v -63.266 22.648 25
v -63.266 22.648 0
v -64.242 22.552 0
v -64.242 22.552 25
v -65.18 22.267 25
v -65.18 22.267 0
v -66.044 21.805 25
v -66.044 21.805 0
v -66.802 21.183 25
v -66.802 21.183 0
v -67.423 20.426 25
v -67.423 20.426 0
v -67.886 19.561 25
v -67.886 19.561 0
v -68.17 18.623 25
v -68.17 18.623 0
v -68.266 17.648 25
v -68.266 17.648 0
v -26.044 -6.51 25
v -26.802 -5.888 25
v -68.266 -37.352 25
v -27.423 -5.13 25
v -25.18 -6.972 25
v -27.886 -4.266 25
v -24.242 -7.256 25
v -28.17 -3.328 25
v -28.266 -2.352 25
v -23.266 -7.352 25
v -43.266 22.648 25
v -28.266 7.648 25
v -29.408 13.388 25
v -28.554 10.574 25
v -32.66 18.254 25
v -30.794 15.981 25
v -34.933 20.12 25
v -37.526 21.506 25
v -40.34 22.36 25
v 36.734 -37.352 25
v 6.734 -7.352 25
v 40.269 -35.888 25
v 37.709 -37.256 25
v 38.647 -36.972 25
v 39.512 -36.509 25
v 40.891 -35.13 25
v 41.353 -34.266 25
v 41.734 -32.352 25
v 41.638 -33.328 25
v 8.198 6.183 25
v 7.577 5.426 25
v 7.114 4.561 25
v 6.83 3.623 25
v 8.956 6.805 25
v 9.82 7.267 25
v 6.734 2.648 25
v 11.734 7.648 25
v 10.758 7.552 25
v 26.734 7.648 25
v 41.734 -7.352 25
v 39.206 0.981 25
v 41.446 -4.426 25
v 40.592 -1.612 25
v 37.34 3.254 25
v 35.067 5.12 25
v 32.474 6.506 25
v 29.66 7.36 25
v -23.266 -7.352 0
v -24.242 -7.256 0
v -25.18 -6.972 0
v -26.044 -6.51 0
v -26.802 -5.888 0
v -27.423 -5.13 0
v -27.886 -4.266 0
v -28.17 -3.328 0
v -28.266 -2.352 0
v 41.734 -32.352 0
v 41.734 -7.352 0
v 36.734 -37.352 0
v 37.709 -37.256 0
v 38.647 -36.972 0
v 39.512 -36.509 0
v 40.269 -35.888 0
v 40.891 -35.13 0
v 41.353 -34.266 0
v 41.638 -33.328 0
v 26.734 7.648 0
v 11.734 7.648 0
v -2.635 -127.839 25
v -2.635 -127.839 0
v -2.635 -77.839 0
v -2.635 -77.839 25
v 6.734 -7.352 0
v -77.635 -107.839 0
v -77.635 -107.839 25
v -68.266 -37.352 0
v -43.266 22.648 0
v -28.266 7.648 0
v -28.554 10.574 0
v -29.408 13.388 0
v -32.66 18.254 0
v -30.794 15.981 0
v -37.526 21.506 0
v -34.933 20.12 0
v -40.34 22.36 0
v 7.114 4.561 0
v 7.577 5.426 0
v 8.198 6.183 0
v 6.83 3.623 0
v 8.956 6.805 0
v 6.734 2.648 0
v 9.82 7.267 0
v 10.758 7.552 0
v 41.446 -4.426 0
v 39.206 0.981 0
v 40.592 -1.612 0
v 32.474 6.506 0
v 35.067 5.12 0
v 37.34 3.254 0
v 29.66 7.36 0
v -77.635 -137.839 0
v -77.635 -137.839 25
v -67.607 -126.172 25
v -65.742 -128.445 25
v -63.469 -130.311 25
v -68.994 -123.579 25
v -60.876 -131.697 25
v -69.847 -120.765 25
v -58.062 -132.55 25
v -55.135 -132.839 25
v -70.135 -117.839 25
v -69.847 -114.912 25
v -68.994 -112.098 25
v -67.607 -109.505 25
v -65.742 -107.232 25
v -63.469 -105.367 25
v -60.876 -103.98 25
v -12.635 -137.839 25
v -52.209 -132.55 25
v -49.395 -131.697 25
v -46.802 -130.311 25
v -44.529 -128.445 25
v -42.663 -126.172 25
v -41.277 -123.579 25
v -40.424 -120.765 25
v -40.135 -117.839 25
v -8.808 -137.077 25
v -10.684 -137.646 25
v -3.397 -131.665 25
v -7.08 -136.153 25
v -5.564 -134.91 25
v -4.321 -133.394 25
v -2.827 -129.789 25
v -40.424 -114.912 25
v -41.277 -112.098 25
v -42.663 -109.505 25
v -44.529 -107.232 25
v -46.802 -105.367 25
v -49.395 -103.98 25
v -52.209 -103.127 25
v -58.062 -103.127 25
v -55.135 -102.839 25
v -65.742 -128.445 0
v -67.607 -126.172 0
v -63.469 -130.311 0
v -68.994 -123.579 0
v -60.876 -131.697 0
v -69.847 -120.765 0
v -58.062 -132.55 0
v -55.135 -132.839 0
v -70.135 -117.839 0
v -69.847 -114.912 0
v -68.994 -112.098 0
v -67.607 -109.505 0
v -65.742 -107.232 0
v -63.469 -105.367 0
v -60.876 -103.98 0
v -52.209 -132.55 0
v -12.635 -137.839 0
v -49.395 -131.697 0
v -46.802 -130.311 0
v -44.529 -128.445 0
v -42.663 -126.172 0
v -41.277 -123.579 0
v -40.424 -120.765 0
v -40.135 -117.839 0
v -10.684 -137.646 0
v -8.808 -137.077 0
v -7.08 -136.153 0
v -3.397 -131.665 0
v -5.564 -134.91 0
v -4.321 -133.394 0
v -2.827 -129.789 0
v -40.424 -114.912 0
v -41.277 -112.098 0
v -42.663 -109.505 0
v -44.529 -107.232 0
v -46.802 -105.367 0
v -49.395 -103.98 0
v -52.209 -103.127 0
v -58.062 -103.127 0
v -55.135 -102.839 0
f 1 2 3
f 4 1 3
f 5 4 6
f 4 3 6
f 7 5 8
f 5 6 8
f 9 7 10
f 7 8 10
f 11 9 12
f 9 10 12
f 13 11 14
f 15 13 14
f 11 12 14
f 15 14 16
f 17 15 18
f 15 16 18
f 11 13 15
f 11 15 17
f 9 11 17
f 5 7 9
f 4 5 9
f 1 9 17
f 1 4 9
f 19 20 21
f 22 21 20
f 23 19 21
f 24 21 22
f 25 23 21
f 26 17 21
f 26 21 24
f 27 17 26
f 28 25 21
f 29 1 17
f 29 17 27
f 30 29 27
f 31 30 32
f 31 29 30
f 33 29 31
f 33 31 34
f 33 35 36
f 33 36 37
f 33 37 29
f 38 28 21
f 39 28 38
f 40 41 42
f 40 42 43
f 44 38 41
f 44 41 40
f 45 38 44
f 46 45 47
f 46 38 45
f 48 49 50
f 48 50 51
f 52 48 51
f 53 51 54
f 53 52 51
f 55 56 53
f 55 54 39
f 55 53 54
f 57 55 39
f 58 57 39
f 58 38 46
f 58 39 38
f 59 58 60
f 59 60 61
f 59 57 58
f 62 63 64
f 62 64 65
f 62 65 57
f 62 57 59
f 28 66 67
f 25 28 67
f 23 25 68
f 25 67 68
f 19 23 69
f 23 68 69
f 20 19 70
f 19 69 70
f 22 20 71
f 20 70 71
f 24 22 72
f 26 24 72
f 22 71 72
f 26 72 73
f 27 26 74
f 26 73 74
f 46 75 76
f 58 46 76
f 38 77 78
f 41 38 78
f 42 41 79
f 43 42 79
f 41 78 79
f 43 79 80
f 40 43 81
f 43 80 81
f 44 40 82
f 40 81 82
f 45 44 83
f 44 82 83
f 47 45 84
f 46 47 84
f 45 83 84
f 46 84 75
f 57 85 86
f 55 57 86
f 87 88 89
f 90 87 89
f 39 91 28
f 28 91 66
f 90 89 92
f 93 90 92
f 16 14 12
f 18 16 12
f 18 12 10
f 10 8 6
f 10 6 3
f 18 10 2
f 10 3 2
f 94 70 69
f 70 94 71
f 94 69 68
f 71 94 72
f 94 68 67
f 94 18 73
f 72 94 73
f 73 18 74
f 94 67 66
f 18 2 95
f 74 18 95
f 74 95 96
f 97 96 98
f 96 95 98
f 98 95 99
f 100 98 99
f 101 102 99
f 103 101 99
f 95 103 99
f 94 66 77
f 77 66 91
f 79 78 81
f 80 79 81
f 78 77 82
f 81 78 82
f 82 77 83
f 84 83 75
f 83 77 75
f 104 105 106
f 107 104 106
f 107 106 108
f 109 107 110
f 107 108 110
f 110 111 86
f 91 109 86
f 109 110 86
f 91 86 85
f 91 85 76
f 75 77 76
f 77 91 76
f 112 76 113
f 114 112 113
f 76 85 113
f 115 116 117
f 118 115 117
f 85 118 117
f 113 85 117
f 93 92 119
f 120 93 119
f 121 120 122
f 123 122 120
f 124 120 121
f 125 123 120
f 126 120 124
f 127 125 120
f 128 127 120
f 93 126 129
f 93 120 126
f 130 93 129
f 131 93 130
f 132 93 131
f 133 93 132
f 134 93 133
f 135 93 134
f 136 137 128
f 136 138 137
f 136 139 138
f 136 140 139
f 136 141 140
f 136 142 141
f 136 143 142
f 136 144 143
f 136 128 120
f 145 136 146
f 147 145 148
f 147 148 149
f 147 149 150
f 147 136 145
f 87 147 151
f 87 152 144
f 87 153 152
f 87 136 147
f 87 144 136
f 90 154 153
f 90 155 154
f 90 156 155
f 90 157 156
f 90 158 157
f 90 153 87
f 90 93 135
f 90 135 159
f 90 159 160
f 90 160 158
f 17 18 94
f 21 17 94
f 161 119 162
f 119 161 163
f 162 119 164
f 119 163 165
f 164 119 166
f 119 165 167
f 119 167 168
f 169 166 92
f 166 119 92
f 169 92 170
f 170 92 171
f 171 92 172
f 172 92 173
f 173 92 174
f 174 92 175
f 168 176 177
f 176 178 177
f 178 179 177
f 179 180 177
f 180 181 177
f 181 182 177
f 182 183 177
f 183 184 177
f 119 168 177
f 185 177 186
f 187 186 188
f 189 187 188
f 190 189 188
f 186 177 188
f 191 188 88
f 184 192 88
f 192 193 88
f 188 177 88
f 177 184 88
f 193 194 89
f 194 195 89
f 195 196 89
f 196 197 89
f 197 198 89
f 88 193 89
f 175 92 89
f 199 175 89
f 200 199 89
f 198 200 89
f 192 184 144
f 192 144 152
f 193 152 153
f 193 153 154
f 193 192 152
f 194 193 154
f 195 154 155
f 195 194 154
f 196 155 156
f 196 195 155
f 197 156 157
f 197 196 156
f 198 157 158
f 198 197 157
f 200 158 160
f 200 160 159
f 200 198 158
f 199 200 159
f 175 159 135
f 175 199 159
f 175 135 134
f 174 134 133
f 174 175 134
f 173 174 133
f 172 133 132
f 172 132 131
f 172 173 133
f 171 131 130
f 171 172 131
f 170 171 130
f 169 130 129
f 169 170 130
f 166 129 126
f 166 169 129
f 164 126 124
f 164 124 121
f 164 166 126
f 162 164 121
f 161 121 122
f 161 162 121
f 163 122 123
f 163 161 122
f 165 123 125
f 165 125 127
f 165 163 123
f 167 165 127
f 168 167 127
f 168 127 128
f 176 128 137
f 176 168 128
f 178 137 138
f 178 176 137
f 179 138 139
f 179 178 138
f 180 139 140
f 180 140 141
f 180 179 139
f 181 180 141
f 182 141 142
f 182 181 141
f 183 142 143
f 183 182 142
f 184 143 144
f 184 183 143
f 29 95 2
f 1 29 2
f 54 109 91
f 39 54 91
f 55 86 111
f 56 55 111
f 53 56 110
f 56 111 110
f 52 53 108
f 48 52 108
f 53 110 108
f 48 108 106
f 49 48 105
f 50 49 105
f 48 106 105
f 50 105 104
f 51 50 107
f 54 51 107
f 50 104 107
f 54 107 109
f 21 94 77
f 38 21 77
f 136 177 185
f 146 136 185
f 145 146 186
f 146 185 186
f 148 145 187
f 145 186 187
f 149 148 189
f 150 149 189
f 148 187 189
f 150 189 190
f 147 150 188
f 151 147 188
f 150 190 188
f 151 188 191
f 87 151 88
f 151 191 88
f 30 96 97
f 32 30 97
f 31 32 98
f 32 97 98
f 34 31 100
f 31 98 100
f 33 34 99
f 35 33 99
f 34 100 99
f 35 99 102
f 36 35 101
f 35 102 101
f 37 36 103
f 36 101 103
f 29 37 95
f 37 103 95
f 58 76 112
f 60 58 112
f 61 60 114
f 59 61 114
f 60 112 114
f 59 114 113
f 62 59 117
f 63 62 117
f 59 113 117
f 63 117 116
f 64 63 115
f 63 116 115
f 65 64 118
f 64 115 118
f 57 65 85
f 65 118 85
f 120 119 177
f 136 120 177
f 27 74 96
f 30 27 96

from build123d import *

# Parameters (mm, degrees)
F1_DEPTH = 25
F0_R     = 15
F2_DEPTH = 25


with BuildPart() as f1:
    # F0 (on Top) → F1 (new body)
    with BuildSketch(Plane.XY):
        with BuildLine():
            Line((-68.266129, 17.647848), (-68.266129, -37.352152))
            Line((-68.266129, -37.352152), (36.733871, -37.352152))
            ThreePointArc((36.733871, -37.352152), (40.269404, -35.887686), (41.733871, -32.352152))
            Line((41.733871, -32.352152), (41.733871, -7.352152))
            ThreePointArc((41.733871, -7.352152), (37.340472, 3.25445), (26.733871, 7.647848))
            Line((26.733871, 7.647848), (11.733871, 7.647848))
            ThreePointArc((11.733871, 7.647848), (8.198337, 6.183382), (6.733871, 2.647848))
            Line((6.733871, 2.647848), (6.733871, -7.352152))
            Line((6.733871, -7.352152), (-23.266129, -7.352152))
            ThreePointArc((-23.266129, -7.352152), (-26.801663, -5.887686), (-28.266129, -2.352152))
            Line((-28.266129, -2.352152), (-28.266129, 7.647848))
            ThreePointArc((-28.266129, 7.647848), (-32.659528, 18.25445), (-43.266129, 22.647848))
            Line((-43.266129, 22.647848), (-63.266129, 22.647848))
            ThreePointArc((-63.266129, 22.647848), (-66.801663, 21.183382), (-68.266129, 17.647848))
        make_face()
    extrude(amount=F1_DEPTH)


with BuildPart() as f2:
    # F0 (on Top) → F2 (new body)
    with BuildSketch(Plane.XY):
        with BuildLine():
            Line((-77.635311, -107.838587), (-77.635311, -137.838587))
            Line((-77.635311, -137.838587), (-12.635311, -137.838587))
            ThreePointArc((-12.635311, -137.838587), (-5.564243, -134.909655), (-2.635311, -127.838587))
            Line((-2.635311, -127.838587), (-2.635311, -77.838587))
            Line((-2.635311, -77.838587), (-77.635311, -107.838587))
        make_face()
        with Locations((-55.135311, -117.838587)):
            Circle(F0_R, mode=Mode.SUBTRACT)
    extrude(amount=F2_DEPTH)


solid = Compound([f1.part, f2.part])
